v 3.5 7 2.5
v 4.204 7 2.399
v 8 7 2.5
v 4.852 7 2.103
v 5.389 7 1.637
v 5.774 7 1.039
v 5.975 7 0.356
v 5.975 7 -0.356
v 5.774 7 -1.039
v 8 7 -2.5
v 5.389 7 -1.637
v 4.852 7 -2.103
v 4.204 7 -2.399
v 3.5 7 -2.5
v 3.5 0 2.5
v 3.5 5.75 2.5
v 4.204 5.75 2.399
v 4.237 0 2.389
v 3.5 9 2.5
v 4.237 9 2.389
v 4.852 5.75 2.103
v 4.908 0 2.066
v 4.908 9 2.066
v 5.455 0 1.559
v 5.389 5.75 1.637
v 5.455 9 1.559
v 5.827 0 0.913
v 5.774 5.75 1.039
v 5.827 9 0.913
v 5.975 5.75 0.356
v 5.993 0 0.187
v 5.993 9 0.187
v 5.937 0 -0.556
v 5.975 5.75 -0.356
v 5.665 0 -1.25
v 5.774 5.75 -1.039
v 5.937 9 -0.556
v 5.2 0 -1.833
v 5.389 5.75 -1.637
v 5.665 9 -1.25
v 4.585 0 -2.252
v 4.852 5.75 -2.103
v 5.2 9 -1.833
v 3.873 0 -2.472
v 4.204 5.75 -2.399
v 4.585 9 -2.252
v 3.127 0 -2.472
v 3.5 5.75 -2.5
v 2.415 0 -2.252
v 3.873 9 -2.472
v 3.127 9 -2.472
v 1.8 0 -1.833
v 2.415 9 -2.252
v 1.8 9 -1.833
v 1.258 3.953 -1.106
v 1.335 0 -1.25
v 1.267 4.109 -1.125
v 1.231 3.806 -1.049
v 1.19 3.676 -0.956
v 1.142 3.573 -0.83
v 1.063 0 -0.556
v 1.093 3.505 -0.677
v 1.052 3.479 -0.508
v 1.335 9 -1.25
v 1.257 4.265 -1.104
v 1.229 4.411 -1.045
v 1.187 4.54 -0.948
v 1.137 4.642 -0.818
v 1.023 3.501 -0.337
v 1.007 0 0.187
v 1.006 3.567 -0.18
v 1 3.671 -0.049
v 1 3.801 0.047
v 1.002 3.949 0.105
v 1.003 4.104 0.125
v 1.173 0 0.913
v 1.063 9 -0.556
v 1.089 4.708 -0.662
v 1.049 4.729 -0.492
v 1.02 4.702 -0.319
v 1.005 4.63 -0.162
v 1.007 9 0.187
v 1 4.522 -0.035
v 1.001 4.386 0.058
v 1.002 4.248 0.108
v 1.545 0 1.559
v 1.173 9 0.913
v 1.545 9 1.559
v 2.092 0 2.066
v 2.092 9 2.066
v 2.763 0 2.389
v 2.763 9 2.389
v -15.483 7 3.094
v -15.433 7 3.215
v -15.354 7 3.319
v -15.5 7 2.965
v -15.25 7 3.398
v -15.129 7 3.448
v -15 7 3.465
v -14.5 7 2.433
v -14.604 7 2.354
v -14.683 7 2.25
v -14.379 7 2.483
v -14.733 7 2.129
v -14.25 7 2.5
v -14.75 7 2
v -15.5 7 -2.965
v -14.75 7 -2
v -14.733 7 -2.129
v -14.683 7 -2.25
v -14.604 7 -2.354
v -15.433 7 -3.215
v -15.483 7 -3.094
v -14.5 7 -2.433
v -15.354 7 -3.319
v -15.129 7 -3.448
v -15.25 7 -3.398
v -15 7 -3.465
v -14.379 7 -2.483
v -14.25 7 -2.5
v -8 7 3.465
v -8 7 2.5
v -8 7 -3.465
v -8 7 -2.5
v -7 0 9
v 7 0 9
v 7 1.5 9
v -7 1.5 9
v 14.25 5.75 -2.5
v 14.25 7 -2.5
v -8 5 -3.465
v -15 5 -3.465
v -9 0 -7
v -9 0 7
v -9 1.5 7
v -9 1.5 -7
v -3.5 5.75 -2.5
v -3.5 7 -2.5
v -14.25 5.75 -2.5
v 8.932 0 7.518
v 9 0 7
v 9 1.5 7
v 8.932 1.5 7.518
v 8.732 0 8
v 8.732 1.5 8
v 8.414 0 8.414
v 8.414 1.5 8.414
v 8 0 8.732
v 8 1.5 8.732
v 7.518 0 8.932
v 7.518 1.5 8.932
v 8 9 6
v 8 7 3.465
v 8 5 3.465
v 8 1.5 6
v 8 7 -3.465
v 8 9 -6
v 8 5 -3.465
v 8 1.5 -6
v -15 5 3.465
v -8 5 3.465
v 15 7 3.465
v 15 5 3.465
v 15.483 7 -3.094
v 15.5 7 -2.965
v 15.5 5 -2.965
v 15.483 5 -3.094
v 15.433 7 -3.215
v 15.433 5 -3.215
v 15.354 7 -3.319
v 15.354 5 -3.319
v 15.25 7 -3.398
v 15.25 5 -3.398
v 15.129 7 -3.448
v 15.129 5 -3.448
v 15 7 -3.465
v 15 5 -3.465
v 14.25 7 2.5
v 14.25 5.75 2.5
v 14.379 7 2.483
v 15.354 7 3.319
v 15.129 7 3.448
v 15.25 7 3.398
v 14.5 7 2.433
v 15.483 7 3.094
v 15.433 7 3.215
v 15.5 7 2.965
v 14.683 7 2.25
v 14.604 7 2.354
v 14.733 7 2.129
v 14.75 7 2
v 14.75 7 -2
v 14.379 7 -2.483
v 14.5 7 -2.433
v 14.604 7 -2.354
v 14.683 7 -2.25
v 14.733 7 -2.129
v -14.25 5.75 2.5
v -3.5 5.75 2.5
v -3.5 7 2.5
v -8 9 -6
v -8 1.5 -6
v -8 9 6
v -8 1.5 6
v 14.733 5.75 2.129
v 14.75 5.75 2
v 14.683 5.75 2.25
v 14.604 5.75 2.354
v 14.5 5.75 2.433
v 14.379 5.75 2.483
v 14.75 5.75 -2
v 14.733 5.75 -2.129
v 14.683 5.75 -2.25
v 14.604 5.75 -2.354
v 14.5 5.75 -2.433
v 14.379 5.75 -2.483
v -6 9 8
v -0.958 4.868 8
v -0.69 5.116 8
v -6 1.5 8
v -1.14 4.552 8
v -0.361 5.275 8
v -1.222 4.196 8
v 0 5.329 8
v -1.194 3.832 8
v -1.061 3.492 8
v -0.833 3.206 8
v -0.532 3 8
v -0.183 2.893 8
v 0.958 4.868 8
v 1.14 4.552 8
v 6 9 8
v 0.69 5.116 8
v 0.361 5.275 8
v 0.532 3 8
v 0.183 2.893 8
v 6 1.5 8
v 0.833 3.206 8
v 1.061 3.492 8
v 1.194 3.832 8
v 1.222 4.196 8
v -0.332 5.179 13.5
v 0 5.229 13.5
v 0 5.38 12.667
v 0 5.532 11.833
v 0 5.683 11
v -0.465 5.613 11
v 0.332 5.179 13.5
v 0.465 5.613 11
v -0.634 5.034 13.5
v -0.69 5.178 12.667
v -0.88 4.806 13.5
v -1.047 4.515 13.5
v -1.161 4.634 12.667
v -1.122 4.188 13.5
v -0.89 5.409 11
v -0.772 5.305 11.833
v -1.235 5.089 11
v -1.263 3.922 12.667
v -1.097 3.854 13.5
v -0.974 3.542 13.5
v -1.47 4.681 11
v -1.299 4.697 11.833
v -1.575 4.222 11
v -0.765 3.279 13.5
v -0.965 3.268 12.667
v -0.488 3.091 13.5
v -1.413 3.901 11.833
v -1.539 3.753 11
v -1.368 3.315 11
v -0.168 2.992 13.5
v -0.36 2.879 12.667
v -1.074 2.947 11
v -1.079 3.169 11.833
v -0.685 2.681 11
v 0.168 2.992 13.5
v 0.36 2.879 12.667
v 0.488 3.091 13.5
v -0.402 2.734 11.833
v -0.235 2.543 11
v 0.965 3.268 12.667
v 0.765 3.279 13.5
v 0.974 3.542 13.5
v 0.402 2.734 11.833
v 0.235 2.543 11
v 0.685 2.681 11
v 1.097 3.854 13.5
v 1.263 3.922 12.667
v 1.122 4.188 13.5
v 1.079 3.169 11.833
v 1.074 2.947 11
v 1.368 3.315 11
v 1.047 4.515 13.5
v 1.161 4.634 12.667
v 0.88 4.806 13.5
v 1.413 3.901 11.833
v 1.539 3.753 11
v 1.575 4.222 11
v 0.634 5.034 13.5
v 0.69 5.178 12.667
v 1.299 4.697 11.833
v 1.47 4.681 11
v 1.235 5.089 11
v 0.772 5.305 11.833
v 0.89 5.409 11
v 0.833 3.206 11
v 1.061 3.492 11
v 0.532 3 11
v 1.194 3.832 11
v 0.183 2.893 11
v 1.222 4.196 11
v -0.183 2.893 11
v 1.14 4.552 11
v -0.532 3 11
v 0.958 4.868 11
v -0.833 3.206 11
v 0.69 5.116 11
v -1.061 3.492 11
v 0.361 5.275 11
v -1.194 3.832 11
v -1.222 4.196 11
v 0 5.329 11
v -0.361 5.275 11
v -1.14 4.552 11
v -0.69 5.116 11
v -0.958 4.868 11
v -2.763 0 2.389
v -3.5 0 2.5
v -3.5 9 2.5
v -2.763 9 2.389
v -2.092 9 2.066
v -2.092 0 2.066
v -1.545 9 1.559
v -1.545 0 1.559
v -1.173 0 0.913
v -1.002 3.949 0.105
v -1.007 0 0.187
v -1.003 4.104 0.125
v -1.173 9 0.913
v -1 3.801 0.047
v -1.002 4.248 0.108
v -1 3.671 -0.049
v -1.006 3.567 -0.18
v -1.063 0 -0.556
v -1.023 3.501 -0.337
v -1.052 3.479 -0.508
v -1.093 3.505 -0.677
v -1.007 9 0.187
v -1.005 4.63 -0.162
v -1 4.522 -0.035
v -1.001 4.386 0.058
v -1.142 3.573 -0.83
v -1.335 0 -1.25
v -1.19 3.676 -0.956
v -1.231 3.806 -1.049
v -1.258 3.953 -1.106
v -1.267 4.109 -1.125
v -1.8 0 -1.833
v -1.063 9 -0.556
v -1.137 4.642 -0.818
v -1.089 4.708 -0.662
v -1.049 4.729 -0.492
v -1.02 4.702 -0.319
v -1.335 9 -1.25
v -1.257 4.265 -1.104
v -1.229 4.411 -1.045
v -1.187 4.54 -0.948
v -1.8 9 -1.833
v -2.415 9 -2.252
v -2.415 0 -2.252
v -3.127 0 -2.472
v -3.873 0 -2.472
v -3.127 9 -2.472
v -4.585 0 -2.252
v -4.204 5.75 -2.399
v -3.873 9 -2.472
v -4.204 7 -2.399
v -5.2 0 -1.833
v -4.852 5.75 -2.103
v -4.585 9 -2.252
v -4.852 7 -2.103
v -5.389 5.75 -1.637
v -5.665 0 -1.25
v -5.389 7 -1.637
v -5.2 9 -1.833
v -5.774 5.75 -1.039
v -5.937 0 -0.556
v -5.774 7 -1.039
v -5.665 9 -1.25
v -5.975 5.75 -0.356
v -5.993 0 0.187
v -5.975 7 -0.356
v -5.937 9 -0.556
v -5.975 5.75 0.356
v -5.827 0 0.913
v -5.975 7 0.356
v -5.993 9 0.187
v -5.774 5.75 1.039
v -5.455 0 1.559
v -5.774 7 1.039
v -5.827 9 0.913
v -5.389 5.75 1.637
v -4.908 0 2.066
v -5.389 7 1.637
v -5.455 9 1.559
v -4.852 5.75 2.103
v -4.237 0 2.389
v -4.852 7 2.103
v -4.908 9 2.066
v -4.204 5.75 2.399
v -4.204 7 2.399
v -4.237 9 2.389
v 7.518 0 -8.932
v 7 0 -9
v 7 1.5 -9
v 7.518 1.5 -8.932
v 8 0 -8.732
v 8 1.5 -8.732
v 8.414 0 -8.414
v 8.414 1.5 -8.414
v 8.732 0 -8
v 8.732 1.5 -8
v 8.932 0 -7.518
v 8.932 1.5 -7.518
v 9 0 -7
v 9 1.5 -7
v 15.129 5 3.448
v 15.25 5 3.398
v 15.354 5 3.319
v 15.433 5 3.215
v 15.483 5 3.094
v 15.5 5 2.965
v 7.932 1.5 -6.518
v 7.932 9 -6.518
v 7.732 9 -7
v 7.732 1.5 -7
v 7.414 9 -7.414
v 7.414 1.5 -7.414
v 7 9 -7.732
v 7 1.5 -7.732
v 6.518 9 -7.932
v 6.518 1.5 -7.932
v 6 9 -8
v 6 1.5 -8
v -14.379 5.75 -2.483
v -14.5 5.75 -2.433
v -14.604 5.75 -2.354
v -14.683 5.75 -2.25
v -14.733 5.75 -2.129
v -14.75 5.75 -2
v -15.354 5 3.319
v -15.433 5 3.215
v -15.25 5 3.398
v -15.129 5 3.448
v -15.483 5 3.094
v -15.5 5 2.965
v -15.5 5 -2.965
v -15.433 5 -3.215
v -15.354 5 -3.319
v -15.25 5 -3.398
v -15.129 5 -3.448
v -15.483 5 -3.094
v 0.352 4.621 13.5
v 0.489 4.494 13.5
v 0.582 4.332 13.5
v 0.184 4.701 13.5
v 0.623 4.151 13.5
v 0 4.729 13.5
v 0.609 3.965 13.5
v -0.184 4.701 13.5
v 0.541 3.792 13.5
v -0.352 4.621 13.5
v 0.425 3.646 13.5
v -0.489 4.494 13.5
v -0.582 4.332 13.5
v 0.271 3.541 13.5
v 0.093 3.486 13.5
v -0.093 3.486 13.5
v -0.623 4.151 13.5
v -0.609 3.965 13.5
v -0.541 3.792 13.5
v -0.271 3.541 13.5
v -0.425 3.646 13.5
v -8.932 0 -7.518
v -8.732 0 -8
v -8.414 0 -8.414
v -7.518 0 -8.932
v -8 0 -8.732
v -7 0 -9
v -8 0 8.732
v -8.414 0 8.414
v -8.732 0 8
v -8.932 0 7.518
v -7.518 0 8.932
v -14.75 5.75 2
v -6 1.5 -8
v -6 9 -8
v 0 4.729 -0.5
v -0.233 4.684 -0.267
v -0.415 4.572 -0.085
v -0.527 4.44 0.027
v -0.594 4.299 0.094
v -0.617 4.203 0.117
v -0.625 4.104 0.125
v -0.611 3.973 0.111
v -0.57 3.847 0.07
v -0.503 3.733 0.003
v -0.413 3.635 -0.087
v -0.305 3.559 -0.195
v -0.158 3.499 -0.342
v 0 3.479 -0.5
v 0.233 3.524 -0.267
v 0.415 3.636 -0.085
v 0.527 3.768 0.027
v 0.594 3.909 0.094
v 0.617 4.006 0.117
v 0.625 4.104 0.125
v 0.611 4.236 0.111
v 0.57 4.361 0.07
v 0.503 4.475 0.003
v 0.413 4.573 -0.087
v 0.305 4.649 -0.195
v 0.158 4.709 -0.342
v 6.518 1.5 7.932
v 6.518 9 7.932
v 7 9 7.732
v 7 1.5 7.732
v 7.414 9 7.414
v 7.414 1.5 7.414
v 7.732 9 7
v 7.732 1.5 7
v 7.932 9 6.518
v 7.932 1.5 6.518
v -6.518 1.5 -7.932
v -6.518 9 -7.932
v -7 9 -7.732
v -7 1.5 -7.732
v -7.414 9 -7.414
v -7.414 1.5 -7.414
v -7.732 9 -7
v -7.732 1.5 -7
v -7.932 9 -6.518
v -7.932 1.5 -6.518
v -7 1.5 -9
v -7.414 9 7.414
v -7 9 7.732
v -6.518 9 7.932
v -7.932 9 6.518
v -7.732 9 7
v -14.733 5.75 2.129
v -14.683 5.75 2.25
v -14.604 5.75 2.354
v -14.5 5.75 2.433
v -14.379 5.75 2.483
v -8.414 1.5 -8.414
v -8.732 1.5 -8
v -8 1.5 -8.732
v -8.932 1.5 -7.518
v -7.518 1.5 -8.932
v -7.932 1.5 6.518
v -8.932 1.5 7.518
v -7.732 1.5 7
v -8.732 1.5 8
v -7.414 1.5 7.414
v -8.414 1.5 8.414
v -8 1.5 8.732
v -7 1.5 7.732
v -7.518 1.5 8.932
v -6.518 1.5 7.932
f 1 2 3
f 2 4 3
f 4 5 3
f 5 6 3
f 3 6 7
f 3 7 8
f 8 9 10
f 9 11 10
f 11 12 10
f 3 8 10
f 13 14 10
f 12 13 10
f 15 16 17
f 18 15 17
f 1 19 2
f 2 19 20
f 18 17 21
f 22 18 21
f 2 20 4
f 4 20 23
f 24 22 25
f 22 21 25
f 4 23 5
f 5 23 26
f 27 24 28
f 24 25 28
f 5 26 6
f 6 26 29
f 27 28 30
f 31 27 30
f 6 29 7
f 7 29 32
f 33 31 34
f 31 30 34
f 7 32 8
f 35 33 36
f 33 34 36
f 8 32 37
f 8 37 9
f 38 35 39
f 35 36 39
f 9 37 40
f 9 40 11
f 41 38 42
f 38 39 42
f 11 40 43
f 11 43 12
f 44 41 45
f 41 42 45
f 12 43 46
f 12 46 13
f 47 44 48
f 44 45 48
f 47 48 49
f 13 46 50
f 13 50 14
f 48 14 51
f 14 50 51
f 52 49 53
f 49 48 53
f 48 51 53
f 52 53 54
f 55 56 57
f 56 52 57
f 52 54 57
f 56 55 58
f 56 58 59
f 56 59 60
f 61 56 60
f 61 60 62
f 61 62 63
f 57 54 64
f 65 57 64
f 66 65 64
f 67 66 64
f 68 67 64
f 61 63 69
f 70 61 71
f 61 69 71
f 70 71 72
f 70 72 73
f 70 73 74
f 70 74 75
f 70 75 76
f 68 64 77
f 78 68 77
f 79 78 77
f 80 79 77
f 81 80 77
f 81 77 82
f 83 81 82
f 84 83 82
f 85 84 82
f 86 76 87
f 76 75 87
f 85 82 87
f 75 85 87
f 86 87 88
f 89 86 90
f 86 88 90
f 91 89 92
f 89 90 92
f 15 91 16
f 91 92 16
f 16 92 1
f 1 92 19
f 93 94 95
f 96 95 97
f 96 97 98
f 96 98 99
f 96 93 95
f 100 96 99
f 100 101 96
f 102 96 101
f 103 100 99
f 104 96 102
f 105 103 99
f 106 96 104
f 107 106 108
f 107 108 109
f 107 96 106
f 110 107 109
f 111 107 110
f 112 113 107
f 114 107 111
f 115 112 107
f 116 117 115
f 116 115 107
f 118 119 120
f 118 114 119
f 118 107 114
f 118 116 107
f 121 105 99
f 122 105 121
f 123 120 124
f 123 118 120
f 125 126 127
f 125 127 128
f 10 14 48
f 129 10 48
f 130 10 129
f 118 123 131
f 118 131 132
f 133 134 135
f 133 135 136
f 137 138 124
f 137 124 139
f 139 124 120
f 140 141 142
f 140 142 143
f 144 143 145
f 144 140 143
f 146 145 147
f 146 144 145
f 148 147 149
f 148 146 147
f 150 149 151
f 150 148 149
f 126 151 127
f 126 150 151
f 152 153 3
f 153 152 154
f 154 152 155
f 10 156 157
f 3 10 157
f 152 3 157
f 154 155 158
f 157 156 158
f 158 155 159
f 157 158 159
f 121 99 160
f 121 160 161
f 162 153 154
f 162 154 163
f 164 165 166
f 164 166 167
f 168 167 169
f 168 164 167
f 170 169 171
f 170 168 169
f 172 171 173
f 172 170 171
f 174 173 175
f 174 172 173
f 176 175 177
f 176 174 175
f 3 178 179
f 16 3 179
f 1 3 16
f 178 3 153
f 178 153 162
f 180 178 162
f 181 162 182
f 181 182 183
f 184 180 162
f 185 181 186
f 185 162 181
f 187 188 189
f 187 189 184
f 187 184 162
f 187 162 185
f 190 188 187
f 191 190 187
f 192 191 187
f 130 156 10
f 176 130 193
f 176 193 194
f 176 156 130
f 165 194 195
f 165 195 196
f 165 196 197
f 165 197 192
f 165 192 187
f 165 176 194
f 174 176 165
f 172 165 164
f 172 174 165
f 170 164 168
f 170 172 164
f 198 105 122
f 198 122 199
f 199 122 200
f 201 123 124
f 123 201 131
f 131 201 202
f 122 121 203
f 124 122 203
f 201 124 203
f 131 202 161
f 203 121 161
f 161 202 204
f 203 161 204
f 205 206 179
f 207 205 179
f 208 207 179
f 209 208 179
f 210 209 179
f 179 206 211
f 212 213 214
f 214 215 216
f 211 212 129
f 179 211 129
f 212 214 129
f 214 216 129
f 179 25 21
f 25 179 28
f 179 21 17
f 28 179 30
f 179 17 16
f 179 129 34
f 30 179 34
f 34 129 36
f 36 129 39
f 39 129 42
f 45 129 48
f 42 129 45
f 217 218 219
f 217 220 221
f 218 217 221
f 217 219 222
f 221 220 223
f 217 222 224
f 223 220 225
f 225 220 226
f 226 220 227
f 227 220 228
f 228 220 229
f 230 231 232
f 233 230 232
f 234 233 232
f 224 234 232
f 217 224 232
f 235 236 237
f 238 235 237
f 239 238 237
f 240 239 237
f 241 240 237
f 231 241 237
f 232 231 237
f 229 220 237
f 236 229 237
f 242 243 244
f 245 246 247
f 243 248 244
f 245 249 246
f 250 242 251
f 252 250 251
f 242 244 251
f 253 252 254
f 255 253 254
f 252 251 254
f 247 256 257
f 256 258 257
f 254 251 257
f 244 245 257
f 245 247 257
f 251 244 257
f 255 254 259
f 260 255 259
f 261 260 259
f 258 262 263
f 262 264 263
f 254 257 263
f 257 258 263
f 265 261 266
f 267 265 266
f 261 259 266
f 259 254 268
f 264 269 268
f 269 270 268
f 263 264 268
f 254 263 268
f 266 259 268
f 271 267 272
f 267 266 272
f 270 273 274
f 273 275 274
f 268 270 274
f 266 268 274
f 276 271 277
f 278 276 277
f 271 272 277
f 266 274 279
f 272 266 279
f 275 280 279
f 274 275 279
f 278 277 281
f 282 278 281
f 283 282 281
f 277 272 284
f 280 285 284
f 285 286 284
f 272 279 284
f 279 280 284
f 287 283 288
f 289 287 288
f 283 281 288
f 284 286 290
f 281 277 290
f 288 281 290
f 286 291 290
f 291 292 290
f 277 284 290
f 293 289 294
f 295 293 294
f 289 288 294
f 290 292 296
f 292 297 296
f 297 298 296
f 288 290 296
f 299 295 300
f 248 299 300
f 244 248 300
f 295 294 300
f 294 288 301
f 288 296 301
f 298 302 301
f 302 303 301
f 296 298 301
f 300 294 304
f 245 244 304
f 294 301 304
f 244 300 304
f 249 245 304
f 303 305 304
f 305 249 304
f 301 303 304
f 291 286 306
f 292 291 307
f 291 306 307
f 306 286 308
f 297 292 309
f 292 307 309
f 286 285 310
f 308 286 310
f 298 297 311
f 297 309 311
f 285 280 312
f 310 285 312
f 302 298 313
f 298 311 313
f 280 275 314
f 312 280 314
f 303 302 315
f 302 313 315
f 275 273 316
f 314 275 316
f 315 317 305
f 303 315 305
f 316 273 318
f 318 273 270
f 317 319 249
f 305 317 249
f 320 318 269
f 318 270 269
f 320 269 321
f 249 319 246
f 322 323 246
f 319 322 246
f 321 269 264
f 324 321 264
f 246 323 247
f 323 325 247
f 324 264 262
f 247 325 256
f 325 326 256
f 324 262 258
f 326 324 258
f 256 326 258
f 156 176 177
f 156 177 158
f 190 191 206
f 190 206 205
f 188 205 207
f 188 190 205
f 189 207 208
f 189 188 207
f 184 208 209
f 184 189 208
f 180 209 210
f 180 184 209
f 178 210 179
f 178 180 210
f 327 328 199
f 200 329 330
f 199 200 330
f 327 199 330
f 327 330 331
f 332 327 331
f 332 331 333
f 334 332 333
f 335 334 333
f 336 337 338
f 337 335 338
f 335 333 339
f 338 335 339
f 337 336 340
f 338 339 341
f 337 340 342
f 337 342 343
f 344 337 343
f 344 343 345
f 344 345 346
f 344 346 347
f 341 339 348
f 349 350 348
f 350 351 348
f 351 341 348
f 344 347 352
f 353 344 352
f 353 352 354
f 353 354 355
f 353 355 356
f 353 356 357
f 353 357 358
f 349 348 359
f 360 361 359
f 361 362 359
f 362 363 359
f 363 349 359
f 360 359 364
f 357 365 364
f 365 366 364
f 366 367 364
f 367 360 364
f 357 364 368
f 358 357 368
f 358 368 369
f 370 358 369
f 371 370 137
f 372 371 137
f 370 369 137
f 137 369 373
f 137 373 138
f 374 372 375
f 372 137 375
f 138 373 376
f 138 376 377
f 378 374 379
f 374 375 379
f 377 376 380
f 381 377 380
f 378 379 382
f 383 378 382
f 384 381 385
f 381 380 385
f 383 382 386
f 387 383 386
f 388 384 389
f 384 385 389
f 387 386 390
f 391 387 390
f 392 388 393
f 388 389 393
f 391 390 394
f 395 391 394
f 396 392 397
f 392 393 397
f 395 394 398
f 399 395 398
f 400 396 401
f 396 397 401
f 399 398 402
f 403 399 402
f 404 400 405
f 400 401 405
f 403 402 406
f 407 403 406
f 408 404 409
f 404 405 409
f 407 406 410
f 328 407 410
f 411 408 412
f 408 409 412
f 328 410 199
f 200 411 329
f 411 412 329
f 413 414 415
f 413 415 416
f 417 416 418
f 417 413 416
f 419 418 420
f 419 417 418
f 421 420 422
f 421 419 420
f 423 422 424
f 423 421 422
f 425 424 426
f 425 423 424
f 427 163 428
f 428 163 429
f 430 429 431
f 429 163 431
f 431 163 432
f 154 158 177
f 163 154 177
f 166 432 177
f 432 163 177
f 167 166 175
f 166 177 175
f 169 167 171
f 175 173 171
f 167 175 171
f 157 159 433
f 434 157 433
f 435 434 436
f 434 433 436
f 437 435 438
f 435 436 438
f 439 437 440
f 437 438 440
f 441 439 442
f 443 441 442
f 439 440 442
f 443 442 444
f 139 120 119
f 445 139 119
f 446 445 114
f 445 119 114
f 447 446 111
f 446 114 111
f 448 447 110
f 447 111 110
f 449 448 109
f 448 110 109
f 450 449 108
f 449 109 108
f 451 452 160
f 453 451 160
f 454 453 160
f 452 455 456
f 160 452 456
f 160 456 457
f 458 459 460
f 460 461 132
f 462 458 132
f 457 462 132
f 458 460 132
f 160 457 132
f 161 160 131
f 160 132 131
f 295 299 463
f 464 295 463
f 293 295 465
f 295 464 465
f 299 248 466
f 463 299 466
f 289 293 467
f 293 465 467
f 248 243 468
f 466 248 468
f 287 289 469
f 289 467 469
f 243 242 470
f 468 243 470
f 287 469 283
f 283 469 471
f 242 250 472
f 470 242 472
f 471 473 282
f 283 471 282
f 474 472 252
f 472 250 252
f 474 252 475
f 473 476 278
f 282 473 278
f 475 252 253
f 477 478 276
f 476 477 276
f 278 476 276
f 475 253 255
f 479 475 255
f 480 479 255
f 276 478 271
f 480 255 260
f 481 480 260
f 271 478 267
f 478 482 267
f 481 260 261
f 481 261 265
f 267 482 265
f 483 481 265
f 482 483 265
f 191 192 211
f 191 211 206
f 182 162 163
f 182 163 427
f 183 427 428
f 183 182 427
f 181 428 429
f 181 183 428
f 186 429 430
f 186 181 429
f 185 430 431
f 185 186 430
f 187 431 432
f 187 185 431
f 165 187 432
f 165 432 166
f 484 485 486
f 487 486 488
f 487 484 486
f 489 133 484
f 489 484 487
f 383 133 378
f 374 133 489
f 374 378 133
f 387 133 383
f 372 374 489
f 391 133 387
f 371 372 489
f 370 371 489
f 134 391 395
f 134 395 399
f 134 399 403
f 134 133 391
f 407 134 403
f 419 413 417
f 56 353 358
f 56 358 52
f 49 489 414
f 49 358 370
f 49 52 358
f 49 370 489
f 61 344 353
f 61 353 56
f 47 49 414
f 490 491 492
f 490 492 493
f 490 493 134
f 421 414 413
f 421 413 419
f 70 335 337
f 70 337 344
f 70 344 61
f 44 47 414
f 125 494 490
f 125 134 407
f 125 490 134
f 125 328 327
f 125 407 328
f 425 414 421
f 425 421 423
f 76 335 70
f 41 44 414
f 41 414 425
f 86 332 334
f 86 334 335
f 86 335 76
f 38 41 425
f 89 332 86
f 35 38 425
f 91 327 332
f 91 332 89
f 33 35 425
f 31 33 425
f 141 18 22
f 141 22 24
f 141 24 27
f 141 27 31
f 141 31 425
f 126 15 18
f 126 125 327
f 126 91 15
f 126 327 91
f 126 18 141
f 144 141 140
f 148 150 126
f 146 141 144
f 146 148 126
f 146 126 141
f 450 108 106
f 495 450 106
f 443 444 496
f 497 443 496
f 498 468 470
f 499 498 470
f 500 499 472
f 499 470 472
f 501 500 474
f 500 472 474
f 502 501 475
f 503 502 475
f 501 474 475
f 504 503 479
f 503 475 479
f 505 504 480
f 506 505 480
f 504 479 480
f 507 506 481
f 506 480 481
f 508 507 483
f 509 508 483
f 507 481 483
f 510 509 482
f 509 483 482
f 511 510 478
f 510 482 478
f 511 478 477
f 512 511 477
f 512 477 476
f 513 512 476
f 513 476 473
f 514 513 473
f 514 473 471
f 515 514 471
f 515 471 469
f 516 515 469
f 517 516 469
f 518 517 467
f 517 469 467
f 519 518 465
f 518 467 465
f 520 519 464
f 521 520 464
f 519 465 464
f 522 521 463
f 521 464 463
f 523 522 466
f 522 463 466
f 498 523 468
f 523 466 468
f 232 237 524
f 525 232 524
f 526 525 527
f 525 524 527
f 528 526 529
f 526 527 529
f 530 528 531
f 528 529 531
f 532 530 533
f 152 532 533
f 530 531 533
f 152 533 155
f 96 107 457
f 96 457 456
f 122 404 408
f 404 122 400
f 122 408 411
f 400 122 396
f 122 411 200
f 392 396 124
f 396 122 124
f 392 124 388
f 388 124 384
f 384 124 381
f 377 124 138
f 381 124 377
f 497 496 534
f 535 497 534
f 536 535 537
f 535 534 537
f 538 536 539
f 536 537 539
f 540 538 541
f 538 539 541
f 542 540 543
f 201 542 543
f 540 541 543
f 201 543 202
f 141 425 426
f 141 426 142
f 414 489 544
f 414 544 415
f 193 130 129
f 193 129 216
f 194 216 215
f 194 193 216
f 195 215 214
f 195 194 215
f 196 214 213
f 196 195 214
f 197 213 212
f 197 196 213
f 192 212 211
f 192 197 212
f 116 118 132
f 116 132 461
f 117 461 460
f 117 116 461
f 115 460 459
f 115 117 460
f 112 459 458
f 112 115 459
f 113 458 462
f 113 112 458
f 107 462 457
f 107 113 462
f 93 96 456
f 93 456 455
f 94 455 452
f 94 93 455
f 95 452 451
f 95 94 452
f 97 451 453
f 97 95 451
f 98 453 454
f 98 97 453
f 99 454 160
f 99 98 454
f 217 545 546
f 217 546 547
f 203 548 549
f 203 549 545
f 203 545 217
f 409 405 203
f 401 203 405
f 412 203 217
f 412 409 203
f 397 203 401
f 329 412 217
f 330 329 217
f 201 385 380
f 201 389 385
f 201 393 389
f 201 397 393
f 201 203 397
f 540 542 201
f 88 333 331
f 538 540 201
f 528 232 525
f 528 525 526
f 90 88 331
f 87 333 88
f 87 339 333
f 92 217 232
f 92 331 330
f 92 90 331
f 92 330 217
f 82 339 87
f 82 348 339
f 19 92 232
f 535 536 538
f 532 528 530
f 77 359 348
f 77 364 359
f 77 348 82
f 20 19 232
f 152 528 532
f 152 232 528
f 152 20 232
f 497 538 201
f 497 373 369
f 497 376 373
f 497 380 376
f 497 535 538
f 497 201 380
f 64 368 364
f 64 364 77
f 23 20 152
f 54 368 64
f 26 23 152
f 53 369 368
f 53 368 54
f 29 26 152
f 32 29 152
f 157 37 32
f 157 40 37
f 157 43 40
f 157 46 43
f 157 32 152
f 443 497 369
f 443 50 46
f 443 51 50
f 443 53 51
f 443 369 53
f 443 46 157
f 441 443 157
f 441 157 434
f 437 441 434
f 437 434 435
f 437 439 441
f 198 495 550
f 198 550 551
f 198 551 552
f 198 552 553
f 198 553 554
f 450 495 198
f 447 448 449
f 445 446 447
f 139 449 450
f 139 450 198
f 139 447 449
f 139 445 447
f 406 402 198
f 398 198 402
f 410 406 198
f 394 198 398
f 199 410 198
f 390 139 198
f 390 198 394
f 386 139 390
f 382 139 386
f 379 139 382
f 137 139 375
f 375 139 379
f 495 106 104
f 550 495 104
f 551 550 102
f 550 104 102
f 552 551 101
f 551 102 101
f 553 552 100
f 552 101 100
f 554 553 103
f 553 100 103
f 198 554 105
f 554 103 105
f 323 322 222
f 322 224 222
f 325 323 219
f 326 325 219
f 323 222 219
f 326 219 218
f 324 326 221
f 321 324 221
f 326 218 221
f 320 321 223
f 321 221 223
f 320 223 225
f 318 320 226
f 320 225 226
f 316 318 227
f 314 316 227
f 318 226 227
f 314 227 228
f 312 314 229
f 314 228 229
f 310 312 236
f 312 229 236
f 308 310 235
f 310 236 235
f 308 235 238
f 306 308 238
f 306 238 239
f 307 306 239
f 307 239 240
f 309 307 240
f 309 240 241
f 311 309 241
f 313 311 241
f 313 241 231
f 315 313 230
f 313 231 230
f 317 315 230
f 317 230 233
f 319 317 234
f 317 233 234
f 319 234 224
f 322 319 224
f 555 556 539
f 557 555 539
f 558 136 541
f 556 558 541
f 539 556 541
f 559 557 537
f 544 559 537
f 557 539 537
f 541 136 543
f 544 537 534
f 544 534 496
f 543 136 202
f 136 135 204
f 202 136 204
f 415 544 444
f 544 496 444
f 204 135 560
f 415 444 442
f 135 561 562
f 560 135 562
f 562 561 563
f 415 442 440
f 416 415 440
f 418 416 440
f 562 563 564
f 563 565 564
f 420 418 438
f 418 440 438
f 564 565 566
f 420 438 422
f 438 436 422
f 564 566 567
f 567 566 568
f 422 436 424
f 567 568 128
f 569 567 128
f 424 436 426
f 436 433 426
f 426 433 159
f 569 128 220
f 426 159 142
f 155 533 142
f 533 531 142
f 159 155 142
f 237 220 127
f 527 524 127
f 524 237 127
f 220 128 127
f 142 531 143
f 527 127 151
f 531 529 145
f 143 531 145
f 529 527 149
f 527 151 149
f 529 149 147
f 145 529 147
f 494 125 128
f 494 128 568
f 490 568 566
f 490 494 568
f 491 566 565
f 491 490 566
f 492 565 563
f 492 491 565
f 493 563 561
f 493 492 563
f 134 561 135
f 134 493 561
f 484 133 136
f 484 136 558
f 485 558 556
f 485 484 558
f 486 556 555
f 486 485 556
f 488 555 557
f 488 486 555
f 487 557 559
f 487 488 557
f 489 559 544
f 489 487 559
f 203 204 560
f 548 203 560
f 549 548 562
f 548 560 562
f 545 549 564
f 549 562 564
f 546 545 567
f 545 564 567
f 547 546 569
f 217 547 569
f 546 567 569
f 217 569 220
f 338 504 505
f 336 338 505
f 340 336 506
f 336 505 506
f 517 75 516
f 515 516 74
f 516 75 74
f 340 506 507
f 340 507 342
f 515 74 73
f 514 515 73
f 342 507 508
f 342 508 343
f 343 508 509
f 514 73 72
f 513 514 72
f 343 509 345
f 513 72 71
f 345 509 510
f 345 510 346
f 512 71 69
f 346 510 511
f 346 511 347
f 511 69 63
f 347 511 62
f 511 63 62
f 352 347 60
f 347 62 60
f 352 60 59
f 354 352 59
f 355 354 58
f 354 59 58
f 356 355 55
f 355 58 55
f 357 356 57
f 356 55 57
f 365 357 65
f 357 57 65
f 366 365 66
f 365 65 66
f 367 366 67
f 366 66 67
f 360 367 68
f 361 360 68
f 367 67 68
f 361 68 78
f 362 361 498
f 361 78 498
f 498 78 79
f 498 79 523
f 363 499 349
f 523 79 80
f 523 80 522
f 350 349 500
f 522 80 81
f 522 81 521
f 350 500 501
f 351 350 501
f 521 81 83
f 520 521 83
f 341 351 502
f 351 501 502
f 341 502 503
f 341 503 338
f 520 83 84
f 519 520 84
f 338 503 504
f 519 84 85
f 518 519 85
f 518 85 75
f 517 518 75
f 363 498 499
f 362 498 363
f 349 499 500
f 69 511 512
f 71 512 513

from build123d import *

# Parameters (mm, degrees)
BOSS_EXTRUDE2_DEPTH            = 7
BOSS_EXTRUDE3_DEPTH            = 2
CUT_EXTRUDE1_DEPTH             = 1.25
SKETCH6_R                      = 2.5
BOSS_EXTRUDE4_DEPTH            = 2
BOSS_EXTRUDE5_DEPTH            = 1.5
SKETCH7_R                      = 2.5
CUT_EXTRUDE2_DEPTH             = 19.823190484
SKETCH18_R                     = 0.625
CUT_EXTRUDE5_DEPTH             = 8.5
CUT_EXTRUDE6_REACH             = 24.439
SKETCH20_R                     = 0.625
CUT_EXTRUDE6_DIRECTION_2_REACH = 24.439


with BuildPart() as part:
    # Sketch3 → Boss-Extrude2 (new body)
    with BuildSketch(Plane(origin=(0, 0, 0), x_dir=(1, 0, 0), z_dir=(0, 1, 0))):
        with BuildLine():
            Line((-6, -8), (6, -8))
            ThreePointArc((6, -8), (7.414213562, -7.414213562), (8, -6))
            Line((8, -6), (8, 6))
            ThreePointArc((8, 6), (7.414213562, 7.414213562), (6, 8))
            Line((6, 8), (-6, 8))
            ThreePointArc((-6, 8), (-7.414213562, 7.414213562), (-8, 6))
            Line((-8, 6), (-8, -6))
            ThreePointArc((-8, -6), (-7.414213562, -7.414213562), (-6, -8))
        make_face()
    extrude(amount=BOSS_EXTRUDE2_DEPTH)

    # Sketch4 → Boss-Extrude3 (add)
    with BuildSketch(Plane(origin=(0, 7, 0), x_dir=(1, 0, 0), z_dir=(0, 1, 0))):
        with BuildLine():
            Line((-15.5, 0), (-8, 0))
            Line((-8, 0), (-8, 3.465))
            Line((-8, 3.465), (-15, 3.465))
            ThreePointArc((-15, 3.465), (-15.353553391, 3.318553391), (-15.5, 2.965))
            Line((-15.5, 2.965), (-15.5, 0))
        make_face()
        with BuildLine():
            Line((-8, -3.465), (-8, 0))
            Line((-8, 0), (-15.5, 0))
            Line((-15.5, 0), (-15.5, -2.965))
            ThreePointArc((-15.5, -2.965), (-15.353553391, -3.318553391), (-15, -3.465))
            Line((-15, -3.465), (-8, -3.465))
        make_face()
        with BuildLine():
            Line((15, 3.465), (8, 3.465))
            Line((8, 3.465), (8, 0))
            Line((8, 0), (15.5, 0))
            Line((15.5, 0), (15.5, 2.965))
            ThreePointArc((15.5, 2.965), (15.353553391, 3.318553391), (15, 3.465))
        make_face()
        with BuildLine():
            Line((15.5, 0), (8, 0))
            Line((8, 0), (8, -3.465))
            Line((8, -3.465), (15, -3.465))
            ThreePointArc((15, -3.465), (15.353553391, -3.318553391), (15.5, -2.965))
            Line((15.5, -2.965), (15.5, 0))
        make_face()
    extrude(amount=-BOSS_EXTRUDE3_DEPTH)

    # Sketch5 → Cut-Extrude1 (cut)
    with BuildSketch(Plane(origin=(0, 7, 0), x_dir=(1, 0, 0), z_dir=(0, 1, 0))):
        with BuildLine():
            Line((-3.5, 2.5), (-14.25, 2.5))
            ThreePointArc((-14.25, 2.5), (-14.603553391, 2.353553391), (-14.75, 2))
            Line((-14.75, 2), (-14.75, -2))
            ThreePointArc((-14.75, -2), (-14.603553391, -2.353553391), (-14.25, -2.5))
            Line((-14.25, -2.5), (-3.5, -2.5))
            ThreePointArc((-3.5, -2.5), (-1, 0), (-3.5, 2.5))
        make_face()
        with BuildLine():
            Line((3.5, 2.5), (14.25, 2.5))
            ThreePointArc((14.25, 2.5), (14.603553391, 2.353553391), (14.75, 2))
            Line((14.75, 2), (14.75, -2))
            ThreePointArc((14.75, -2), (14.603553391, -2.353553391), (14.25, -2.5))
            Line((14.25, -2.5), (3.5, -2.5))
            ThreePointArc((3.5, -2.5), (1, 0), (3.5, 2.5))
        make_face()
    extrude(amount=-CUT_EXTRUDE1_DEPTH, mode=Mode.SUBTRACT)

    # Sketch6 → Boss-Extrude4 (add)
    with BuildSketch(Plane(origin=(0, 7, 0), x_dir=(1, 0, 0), z_dir=(0, 1, 0))):
        with BuildLine():
            Line((-6, -8), (6, -8))
            ThreePointArc((6, -8), (7.414213562, -7.414213562), (8, -6))
            Line((8, -6), (8, 6))
            ThreePointArc((8, 6), (7.414213562, 7.414213562), (6, 8))
            Line((6, 8), (-6, 8))
            ThreePointArc((-6, 8), (-7.414213562, 7.414213562), (-8, 6))
            Line((-8, 6), (-8, -6))
            ThreePointArc((-8, -6), (-7.414213562, -7.414213562), (-6, -8))
        make_face()
        with Locations(Location((3.5, 0, 0), (0, 0, 270))):
            Circle(SKETCH6_R, mode=Mode.SUBTRACT)
        with Locations(Location((-3.5, 0, 0), (0, 0, 270))):
            Circle(SKETCH6_R, mode=Mode.SUBTRACT)
    extrude(amount=BOSS_EXTRUDE4_DEPTH)

    # Sketch8 → Boss-Extrude5 (add)
    with BuildSketch(Plane.XZ):
        with BuildLine():
            Line((-7, -9), (7, -9))
            ThreePointArc((7, -9), (8.414213562, -8.414213562), (9, -7))
            Line((9, -7), (9, 7))
            ThreePointArc((9, 7), (8.414213562, 8.414213562), (7, 9))
            Line((7, 9), (-7, 9))
            ThreePointArc((-7, 9), (-8.414213562, 8.414213562), (-9, 7))
            Line((-9, 7), (-9, -7))
            ThreePointArc((-9, -7), (-8.414213562, -8.414213562), (-7, -9))
        make_face()
    extrude(amount=-BOSS_EXTRUDE5_DEPTH)

    # Sketch7 → Cut-Extrude2 (cut, through all)
    with BuildSketch(Plane(origin=(0, 5.75, 0), x_dir=(1, 0, 0), z_dir=(0, 1, 0))):
        with Locations(Location((-3.5, 0, 0), (0, 0, 270))):
            Circle(SKETCH7_R)
        with Locations(Location((3.5, 0, 0), (0, 0, 270))):
            Circle(SKETCH7_R)
    extrude(amount=-CUT_EXTRUDE2_DEPTH, mode=Mode.SUBTRACT)

    # Sketch13 → Revolve1 (revolve)
    with BuildSketch(Plane(origin=(0, 0, 0), x_dir=(0, 0, -1), z_dir=(1, 0, 0)), mode=Mode.PRIVATE) as revolve1_sk:
        Polygon((-8, 3.479112133), (-13.5, 3.479112133), (-13.5, 2.979112133), (-11, 2.525029687), (-11, 2.879112133), (-8, 2.879112133), align=None)
    revolve(revolve1_sk.sketch.rotate(Axis((0, 4.104112133, 8), (0, 0, 1)), 180), axis=Axis((0, 4.104112133, 8), (0, 0, 1)))

    # Sketch18 → Cut-Extrude5 (cut)
    with BuildSketch(Plane.XY.offset(8)):
        with Locations(Location((0, 4.104112133, 0), (0, 0, 90))):
            Circle(SKETCH18_R)
    extrude(amount=-CUT_EXTRUDE5_DEPTH, mode=Mode.SUBTRACT)

    # Sketch20 → Cut-Extrude6 (cut, up to next)
    with BuildSketch(Plane(origin=(0, 0, 0), x_dir=(0, 0, -1), z_dir=(1, 0, 0)), mode=Mode.PRIVATE) as cut_extrude6_sk1:
        with Locations(Location((0.5, 4.104112133, 0), (0, 0, 180))):
            Circle(SKETCH20_R)
    cut_extrude6_tool1 = extrude(cut_extrude6_sk1.sketch, amount=-CUT_EXTRUDE6_REACH, mode=Mode.PRIVATE) & part.part
    add(cut_extrude6_tool1.solids().sort_by_distance((0, 4.104112, -0.5))[0], mode=Mode.SUBTRACT)

    # Sketch20 → Cut-Extrude6 direction 2 (cut, up to next)
    with BuildSketch(Plane(origin=(0, 0, 0), x_dir=(0, 0, -1), z_dir=(1, 0, 0)), mode=Mode.PRIVATE) as cut_extrude6_direction_2_sk1:
        with Locations(Location((0.5, 4.104112133, 0), (0, 0, 180))):
            Circle(SKETCH20_R)
    cut_extrude6_direction_2_tool1 = extrude(cut_extrude6_direction_2_sk1.sketch, amount=CUT_EXTRUDE6_DIRECTION_2_REACH, mode=Mode.PRIVATE) & part.part
    add(cut_extrude6_direction_2_tool1.solids().sort_by_distance((0, 4.104112, -0.5))[0], mode=Mode.SUBTRACT)


solid = part.part
